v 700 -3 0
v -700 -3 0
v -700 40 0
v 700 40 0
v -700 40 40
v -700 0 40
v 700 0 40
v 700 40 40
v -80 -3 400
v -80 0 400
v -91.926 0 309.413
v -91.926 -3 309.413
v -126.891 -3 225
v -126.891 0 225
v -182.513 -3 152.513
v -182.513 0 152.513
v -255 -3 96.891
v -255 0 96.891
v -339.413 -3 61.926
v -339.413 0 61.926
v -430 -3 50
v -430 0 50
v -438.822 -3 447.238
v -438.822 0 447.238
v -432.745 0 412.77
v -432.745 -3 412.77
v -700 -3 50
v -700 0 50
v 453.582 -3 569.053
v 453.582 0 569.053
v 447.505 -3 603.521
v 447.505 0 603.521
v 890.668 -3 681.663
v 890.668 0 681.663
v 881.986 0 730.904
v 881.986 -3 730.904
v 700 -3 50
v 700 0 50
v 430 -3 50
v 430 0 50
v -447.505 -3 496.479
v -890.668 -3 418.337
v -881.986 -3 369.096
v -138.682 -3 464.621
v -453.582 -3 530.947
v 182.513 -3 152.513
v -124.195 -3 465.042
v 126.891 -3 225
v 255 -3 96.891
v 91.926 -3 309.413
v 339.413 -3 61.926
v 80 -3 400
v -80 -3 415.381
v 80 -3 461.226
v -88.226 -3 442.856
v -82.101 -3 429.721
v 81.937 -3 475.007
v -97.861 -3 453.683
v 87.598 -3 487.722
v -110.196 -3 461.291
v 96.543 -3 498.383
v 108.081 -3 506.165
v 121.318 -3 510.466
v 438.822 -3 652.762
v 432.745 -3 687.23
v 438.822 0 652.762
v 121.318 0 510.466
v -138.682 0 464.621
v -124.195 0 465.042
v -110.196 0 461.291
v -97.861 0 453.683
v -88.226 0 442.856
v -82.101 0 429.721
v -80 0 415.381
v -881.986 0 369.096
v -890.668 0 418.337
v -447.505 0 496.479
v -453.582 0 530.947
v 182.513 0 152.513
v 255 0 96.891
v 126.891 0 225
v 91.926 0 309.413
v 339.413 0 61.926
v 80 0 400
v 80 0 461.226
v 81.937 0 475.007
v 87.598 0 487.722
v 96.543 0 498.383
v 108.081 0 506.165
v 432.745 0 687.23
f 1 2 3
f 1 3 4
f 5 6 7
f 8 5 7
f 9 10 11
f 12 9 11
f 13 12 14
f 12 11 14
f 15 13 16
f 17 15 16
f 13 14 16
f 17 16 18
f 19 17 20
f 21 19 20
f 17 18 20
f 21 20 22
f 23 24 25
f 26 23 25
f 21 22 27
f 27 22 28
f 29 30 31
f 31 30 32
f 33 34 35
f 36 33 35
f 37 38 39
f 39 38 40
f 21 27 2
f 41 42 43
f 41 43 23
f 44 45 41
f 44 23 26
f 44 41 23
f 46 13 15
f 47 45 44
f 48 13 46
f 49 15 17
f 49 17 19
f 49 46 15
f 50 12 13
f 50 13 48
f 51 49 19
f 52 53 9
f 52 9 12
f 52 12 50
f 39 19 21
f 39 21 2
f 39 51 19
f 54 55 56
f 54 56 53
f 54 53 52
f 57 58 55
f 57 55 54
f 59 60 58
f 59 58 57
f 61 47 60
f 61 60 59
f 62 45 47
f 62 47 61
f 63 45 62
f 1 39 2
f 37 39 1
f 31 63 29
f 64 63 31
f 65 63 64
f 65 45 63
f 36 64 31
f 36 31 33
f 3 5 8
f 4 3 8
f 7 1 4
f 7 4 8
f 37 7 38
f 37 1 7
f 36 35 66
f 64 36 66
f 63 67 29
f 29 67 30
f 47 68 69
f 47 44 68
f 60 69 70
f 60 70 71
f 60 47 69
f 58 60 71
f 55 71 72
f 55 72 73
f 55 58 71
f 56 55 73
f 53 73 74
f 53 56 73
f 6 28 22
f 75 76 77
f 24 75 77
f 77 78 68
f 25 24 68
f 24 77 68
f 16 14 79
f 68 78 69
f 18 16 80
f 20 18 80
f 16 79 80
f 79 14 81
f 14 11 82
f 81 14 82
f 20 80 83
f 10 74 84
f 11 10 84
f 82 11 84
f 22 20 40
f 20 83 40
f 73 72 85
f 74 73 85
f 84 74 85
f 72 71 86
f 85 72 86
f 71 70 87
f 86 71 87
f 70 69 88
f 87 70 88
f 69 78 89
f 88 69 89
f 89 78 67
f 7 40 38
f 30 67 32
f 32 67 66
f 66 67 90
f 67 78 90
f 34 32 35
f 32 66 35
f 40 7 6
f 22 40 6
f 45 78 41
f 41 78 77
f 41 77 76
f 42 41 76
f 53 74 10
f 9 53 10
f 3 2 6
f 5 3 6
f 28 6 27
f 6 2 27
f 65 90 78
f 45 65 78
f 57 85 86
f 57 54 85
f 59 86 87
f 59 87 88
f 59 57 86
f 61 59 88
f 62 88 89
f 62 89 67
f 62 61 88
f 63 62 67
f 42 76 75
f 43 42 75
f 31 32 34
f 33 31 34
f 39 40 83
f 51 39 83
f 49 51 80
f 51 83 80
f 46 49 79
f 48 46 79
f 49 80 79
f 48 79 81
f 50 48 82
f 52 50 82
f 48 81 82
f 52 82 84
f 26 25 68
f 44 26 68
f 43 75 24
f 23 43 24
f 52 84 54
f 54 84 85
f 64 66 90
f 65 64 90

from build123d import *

# Parameters (mm, degrees)
F1_DEPTH = 3
F2_R     = 50
F3_W     = 1400
F3_H     = 40
F4_DEPTH = 40


with BuildPart() as f1:
    # F0 (on Front) → F1 (new body)
    with BuildSketch(Plane.XZ):
        with BuildLine():
            Line((80, 503.1805617435), (-80, 474.9682448302))
            Line((-80, 474.9682448302), (-80, 400))
            ThreePointArc((-80, 400), (-182.5126265847, 152.5126265847), (-430, 50))
            Line((-430, 50), (-700, 50))
            Line((-700, 50), (-700, 0))
            Line((-700, 0), (700, 0))
            Line((700, 0), (700, 50))
            Line((700, 50), (430, 50))
            ThreePointArc((430, 50), (182.5126265847, 152.5126265847), (80, 400))
            Line((80, 400), (80, 503.1805617435))
        make_face()
        with BuildLine():
            Line((-881.9857732693, 369.0964462745), (-492.5372057432, 437.7667363276))
            ThreePointArc((-492.5372057432, 437.7667363276), (-502.2519540362, 461.4394293899), (-501.2196146265, 487.0071239782))
            Line((-501.2196146265, 487.0071239782), (-890.6681821527, 418.3368339251))
            Line((-890.6681821527, 418.3368339251), (-881.9857732693, 369.0964462745))
        make_face()
        with BuildLine():
            Line((-438.8222844138, 447.2381262246), (-443.1634888555, 471.8583200499))
            Line((-443.1634888555, 471.8583200499), (-447.5046932972, 496.4785138752))
            Line((-447.5046932972, 496.4785138752), (-501.2196146265, 487.0071239782))
            ThreePointArc((-501.2196146265, 487.0071239782), (-502.2519540362, 461.4394293899), (-492.5372057432, 437.7667363276))
            Line((-492.5372057432, 437.7667363276), (-438.8222844138, 447.2381262246))
        make_face()
        with BuildLine():
            ThreePointArc((-383.1634888555, 471.8583200499), (-383.39180697, 477.0876646147), (-384.0750236748, 482.2772107099))
            Line((-384.0750236748, 482.2772107099), (-443.1634888555, 471.8583200499))
            Line((-443.1634888555, 471.8583200499), (-438.8222844138, 447.2381262246))
            Line((-438.8222844138, 447.2381262246), (-385.1073630845, 456.7095161216))
            ThreePointArc((-385.1073630845, 456.7095161216), (-383.6514415614, 464.2218138547), (-383.1634888555, 471.8583200499))
        make_face()
        with BuildLine():
            Line((-443.1634888555, 471.8583200499), (-384.0750236748, 482.2772107099))
            ThreePointArc((-384.0750236748, 482.2772107099), (-387.6557386402, 494.6374698592), (-393.7897719678, 505.9499037722))
            Line((-393.7897719678, 505.9499037722), (-447.5046932972, 496.4785138752))
            Line((-447.5046932972, 496.4785138752), (-443.1634888555, 471.8583200499))
        make_face()
        with BuildLine():
            Line((-393.7897719678, 505.9499037722), (-4.3412044417, 574.6201938253))
            Line((-4.3412044417, 574.6201938253), (-10.41889066, 609.0884651807))
            Line((-10.41889066, 609.0884651807), (-453.5823795155, 530.9467852306))
            ThreePointArc((-453.5823795155, 530.9467852306), (-420.0208735696, 527.2155179354), (-393.7897719678, 505.9499037722))
        make_face()
        with BuildLine():
            Line((-80, 535.8938415433), (-80, 550))
            Line((-80, 550), (0, 550))
            Line((0, 550), (-4.3412044417, 574.6201938253))
            Line((-4.3412044417, 574.6201938253), (-393.7897719678, 505.9499037722))
            ThreePointArc((-393.7897719678, 505.9499037722), (-387.6557386402, 494.6374698592), (-384.0750236748, 482.2772107099))
            Line((-384.0750236748, 482.2772107099), (-80, 535.8938415433))
        make_face()
        with BuildLine():
            Line((-80, 510.5081762462), (-80, 535.8938415433))
            Line((-80, 535.8938415433), (-384.0750236748, 482.2772107099))
            ThreePointArc((-384.0750236748, 482.2772107099), (-383.39180697, 477.0876646147), (-383.1634888555, 471.8583200499))
            ThreePointArc((-383.1634888555, 471.8583200499), (-383.6514415614, 464.2218138547), (-385.1073630845, 456.7095161216))
            Line((-385.1073630845, 456.7095161216), (-80, 510.5081762462))
        make_face()
        with BuildLine():
            Line((-80, 474.9682448302), (-80, 510.5081762462))
            Line((-80, 510.5081762462), (-385.1073630845, 456.7095161216))
            ThreePointArc((-385.1073630845, 456.7095161216), (-402.4832672908, 427.7548102865), (-432.7445981955, 412.7698548691))
            Line((-432.7445981955, 412.7698548691), (-80, 474.9682448302))
        make_face()
        Polygon((80, 538.7204931595), (-80, 510.5081762462), (-80, 474.9682448302), (80, 503.1805617435), align=None)
        Polygon((0, 550), (-80, 535.8938415433), (-80, 510.5081762462), (80, 538.7204931595), (80, 550), align=None)
        Polygon((0, 550), (-80, 550), (-80, 535.8938415433), align=None)
        with BuildLine():
            Line((443.1634888555, 628.1416799501), (384.0750236748, 617.7227892901))
            ThreePointArc((384.0750236748, 617.7227892901), (387.6557386402, 605.3625301408), (393.7897719678, 594.0500962278))
            Line((393.7897719678, 594.0500962278), (447.5046932972, 603.5214861248))
            Line((447.5046932972, 603.5214861248), (443.1634888555, 628.1416799501))
        make_face()
        with BuildLine():
            Line((-4.3412044417, 574.6201938253), (0, 550))
            Line((0, 550), (384.0750236748, 617.7227892901))
            ThreePointArc((384.0750236748, 617.7227892901), (383.2123374991, 630.5623102494), (385.1073630845, 643.2904838784))
            Line((385.1073630845, 643.2904838784), (-4.3412044417, 574.6201938253))
        make_face()
        with BuildLine():
            Line((447.5046932972, 603.5214861248), (393.7897719678, 594.0500962278))
            ThreePointArc((393.7897719678, 594.0500962278), (420.0208735696, 572.7844820646), (453.5823795155, 569.0532147694))
            Line((453.5823795155, 569.0532147694), (447.5046932972, 603.5214861248))
        make_face()
        with BuildLine():
            ThreePointArc((432.7445981955, 687.2301451309), (402.4832672908, 672.2451897135), (385.1073630845, 643.2904838784))
            Line((385.1073630845, 643.2904838784), (438.8222844138, 652.7618737754))
            Line((438.8222844138, 652.7618737754), (432.7445981955, 687.2301451309))
        make_face()
        with BuildLine():
            Line((393.7897719678, 594.0500962278), (80, 538.7204931595))
            Line((80, 538.7204931595), (80, 503.1805617435))
            Line((80, 503.1805617435), (453.5823795155, 569.0532147694))
            ThreePointArc((453.5823795155, 569.0532147694), (420.0208735696, 572.7844820646), (393.7897719678, 594.0500962278))
        make_face()
        with BuildLine():
            ThreePointArc((385.1073630845, 643.2904838784), (383.2123374991, 630.5623102494), (384.0750236748, 617.7227892901))
            Line((384.0750236748, 617.7227892901), (443.1634888555, 628.1416799501))
            Line((443.1634888555, 628.1416799501), (438.8222844138, 652.7618737754))
            Line((438.8222844138, 652.7618737754), (385.1073630845, 643.2904838784))
        make_face()
        with BuildLine():
            Line((384.0750236748, 617.7227892901), (0, 550))
            Line((0, 550), (80, 550))
            Line((80, 550), (80, 538.7204931595))
            Line((80, 538.7204931595), (393.7897719678, 594.0500962278))
            ThreePointArc((393.7897719678, 594.0500962278), (387.6557386402, 605.3625301408), (384.0750236748, 617.7227892901))
        make_face()
        with BuildLine():
            Line((-10.41889066, 609.0884651807), (-4.3412044417, 574.6201938253))
            Line((-4.3412044417, 574.6201938253), (385.1073630845, 643.2904838784))
            ThreePointArc((385.1073630845, 643.2904838784), (402.4832672908, 672.2451897135), (432.7445981955, 687.2301451309))
            Line((432.7445981955, 687.2301451309), (-10.41889066, 609.0884651807))
        make_face()
        with BuildLine():
            Line((881.9857732693, 730.9035537255), (492.5372057432, 662.2332636724))
            ThreePointArc((492.5372057432, 662.2332636724), (500.4453490438, 645.9963290189), (503.1634888555, 628.1416799501))
            ThreePointArc((503.1634888555, 628.1416799501), (502.6755361496, 620.5051737549), (501.2196146265, 612.9928760218))
            Line((501.2196146265, 612.9928760218), (890.6681821527, 681.6631660749))
            Line((890.6681821527, 681.6631660749), (881.9857732693, 730.9035537255))
        make_face()
        with BuildLine():
            Line((438.8222844138, 652.7618737754), (443.1634888555, 628.1416799501))
            Line((443.1634888555, 628.1416799501), (447.5046932972, 603.5214861248))
            Line((447.5046932972, 603.5214861248), (501.2196146265, 612.9928760218))
            ThreePointArc((501.2196146265, 612.9928760218), (502.6755361496, 620.5051737549), (503.1634888555, 628.1416799501))
            ThreePointArc((503.1634888555, 628.1416799501), (500.4453490438, 645.9963290189), (492.5372057432, 662.2332636724))
            Line((492.5372057432, 662.2332636724), (438.8222844138, 652.7618737754))
        make_face()
        with BuildLine():
            Line((-447.5046932972, 496.4785138752), (-393.7897719678, 505.9499037722))
            ThreePointArc((-393.7897719678, 505.9499037722), (-420.0208735696, 527.2155179354), (-453.5823795155, 530.9467852306))
            Line((-453.5823795155, 530.9467852306), (-447.5046932972, 496.4785138752))
        make_face()
        with BuildLine():
            ThreePointArc((-432.7445981955, 412.7698548691), (-402.4832672908, 427.7548102865), (-385.1073630845, 456.7095161216))
            Line((-385.1073630845, 456.7095161216), (-438.8222844138, 447.2381262246))
            Line((-438.8222844138, 447.2381262246), (-432.7445981955, 412.7698548691))
        make_face()
    extrude(amount=F1_DEPTH)

    # F2
    f2_edges = [f1.edges().sort_by_distance(p)[0] for p in [
        (-80, -1.5, 474.968245),
        (80, -1.5, 503.180562),
    ]]
    fillet(f2_edges, radius=F2_R)

    # F3 (on face) → F4 (join)
    with BuildSketch(Plane.XZ):
        with Locations((0, 20)):
            Rectangle(F3_W, F3_H)
    extrude(amount=-F4_DEPTH)


solid = f1.part
